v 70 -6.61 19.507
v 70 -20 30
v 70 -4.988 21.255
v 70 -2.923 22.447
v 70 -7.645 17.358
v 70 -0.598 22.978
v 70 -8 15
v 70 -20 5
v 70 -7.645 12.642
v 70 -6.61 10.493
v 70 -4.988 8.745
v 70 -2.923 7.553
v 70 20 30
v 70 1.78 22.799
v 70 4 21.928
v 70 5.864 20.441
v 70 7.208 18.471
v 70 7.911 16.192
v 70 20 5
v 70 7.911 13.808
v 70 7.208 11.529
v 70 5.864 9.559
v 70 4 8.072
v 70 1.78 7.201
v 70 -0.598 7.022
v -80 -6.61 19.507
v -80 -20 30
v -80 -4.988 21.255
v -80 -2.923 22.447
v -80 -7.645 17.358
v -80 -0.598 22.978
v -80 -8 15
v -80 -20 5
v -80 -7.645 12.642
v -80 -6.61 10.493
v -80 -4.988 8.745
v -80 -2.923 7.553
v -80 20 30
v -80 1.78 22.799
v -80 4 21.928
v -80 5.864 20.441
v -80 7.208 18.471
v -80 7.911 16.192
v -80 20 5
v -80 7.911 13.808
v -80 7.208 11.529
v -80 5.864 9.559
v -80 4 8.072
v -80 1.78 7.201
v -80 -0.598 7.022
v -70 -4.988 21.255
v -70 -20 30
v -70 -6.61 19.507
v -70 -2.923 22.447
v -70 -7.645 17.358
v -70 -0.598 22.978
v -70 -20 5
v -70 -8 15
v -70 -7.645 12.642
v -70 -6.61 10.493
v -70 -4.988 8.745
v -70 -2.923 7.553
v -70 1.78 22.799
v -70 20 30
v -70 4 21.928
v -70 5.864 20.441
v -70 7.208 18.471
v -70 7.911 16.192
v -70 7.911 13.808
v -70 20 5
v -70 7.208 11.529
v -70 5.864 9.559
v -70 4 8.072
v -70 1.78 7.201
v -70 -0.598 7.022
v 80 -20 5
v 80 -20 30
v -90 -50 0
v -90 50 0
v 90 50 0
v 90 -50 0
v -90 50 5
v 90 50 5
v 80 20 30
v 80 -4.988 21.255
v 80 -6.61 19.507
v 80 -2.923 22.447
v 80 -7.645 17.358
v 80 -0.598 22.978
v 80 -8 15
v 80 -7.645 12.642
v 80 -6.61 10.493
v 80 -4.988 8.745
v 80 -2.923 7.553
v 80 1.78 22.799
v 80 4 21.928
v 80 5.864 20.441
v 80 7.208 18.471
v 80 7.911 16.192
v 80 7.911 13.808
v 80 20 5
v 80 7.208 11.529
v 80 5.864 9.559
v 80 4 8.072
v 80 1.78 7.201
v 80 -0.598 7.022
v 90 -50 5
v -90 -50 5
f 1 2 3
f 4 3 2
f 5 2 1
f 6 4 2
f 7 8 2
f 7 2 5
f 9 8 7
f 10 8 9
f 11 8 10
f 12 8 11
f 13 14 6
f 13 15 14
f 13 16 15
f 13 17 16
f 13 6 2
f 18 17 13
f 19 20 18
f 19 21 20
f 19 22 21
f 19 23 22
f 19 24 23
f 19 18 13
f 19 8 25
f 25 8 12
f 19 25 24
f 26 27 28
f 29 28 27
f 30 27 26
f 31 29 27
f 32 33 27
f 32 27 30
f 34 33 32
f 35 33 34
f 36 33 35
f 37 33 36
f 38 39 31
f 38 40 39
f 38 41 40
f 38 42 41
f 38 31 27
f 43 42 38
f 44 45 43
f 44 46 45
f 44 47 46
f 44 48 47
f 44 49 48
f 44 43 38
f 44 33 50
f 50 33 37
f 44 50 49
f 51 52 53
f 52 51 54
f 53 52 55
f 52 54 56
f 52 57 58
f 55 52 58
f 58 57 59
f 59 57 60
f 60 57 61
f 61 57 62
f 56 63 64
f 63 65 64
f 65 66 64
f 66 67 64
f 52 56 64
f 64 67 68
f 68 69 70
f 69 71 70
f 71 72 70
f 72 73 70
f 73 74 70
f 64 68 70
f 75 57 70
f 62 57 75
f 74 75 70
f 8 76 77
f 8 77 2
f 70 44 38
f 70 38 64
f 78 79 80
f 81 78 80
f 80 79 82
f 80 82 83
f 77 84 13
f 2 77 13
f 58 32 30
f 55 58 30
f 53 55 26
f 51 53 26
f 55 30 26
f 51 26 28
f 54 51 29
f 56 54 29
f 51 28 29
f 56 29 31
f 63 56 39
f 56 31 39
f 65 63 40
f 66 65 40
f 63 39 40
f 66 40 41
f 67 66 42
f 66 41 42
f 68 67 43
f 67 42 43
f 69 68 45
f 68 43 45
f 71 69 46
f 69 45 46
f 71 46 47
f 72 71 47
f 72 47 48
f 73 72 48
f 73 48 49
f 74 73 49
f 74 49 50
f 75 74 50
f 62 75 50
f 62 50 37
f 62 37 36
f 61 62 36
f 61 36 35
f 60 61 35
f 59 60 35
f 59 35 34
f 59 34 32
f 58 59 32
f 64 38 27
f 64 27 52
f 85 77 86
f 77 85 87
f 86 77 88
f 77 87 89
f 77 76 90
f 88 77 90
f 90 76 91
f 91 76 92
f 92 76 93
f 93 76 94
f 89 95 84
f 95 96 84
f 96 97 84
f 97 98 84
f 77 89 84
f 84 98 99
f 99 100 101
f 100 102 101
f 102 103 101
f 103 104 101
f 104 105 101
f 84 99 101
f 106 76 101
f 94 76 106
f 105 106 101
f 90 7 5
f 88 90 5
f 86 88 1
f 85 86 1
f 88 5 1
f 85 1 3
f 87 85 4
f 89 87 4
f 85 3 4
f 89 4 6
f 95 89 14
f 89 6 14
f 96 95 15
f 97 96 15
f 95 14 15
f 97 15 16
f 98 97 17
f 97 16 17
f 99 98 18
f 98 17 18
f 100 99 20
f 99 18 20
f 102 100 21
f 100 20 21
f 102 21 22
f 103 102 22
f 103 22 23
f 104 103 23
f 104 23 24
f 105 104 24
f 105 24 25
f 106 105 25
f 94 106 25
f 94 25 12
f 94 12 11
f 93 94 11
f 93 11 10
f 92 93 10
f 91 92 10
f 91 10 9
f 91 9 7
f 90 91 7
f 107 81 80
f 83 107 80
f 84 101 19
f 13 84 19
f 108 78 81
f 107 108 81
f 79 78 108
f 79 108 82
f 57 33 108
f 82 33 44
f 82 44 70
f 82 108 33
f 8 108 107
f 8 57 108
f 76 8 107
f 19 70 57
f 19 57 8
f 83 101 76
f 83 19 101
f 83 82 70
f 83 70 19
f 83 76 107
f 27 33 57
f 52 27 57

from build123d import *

# Parameters (mm, degrees)
SKETCH_W     = 180
SKETCH_H     = 100
PAD_DEPTH    = 5
SKETCH001_W  = 10
SKETCH001_H  = 40
PAD001_DEPTH = 25
SKETCH002_R  = 8
POCKET_DEPTH = 170.001


with BuildPart() as part:
    # Sketch → Pad (new body)
    with BuildSketch(Plane.XY):
        Rectangle(SKETCH_W, SKETCH_H)
    extrude(amount=PAD_DEPTH)

    # Sketch001 → Pad001 (new body)
    with BuildSketch(Plane.XY.offset(5)):
        with Locations((-75, 0)):
            Rectangle(SKETCH001_W, SKETCH001_H)
    pad001 = extrude(amount=PAD001_DEPTH)

    # Mirrored: Pad001 across Sketch001 V_Axis
    add(pad001.mirror(Plane(origin=(0, 0, 5), x_dir=(0, 0, 1), z_dir=(1, 0, 0))))

    # Sketch002 → Pocket (cut, through all)
    with BuildSketch(Plane(origin=(-80, 0, 0), x_dir=(0, -1, 0), z_dir=(-1, 0, 0))):
        with Locations((0, 15)):
            Circle(SKETCH002_R)
    extrude(amount=-POCKET_DEPTH, mode=Mode.SUBTRACT)


solid = part.part
